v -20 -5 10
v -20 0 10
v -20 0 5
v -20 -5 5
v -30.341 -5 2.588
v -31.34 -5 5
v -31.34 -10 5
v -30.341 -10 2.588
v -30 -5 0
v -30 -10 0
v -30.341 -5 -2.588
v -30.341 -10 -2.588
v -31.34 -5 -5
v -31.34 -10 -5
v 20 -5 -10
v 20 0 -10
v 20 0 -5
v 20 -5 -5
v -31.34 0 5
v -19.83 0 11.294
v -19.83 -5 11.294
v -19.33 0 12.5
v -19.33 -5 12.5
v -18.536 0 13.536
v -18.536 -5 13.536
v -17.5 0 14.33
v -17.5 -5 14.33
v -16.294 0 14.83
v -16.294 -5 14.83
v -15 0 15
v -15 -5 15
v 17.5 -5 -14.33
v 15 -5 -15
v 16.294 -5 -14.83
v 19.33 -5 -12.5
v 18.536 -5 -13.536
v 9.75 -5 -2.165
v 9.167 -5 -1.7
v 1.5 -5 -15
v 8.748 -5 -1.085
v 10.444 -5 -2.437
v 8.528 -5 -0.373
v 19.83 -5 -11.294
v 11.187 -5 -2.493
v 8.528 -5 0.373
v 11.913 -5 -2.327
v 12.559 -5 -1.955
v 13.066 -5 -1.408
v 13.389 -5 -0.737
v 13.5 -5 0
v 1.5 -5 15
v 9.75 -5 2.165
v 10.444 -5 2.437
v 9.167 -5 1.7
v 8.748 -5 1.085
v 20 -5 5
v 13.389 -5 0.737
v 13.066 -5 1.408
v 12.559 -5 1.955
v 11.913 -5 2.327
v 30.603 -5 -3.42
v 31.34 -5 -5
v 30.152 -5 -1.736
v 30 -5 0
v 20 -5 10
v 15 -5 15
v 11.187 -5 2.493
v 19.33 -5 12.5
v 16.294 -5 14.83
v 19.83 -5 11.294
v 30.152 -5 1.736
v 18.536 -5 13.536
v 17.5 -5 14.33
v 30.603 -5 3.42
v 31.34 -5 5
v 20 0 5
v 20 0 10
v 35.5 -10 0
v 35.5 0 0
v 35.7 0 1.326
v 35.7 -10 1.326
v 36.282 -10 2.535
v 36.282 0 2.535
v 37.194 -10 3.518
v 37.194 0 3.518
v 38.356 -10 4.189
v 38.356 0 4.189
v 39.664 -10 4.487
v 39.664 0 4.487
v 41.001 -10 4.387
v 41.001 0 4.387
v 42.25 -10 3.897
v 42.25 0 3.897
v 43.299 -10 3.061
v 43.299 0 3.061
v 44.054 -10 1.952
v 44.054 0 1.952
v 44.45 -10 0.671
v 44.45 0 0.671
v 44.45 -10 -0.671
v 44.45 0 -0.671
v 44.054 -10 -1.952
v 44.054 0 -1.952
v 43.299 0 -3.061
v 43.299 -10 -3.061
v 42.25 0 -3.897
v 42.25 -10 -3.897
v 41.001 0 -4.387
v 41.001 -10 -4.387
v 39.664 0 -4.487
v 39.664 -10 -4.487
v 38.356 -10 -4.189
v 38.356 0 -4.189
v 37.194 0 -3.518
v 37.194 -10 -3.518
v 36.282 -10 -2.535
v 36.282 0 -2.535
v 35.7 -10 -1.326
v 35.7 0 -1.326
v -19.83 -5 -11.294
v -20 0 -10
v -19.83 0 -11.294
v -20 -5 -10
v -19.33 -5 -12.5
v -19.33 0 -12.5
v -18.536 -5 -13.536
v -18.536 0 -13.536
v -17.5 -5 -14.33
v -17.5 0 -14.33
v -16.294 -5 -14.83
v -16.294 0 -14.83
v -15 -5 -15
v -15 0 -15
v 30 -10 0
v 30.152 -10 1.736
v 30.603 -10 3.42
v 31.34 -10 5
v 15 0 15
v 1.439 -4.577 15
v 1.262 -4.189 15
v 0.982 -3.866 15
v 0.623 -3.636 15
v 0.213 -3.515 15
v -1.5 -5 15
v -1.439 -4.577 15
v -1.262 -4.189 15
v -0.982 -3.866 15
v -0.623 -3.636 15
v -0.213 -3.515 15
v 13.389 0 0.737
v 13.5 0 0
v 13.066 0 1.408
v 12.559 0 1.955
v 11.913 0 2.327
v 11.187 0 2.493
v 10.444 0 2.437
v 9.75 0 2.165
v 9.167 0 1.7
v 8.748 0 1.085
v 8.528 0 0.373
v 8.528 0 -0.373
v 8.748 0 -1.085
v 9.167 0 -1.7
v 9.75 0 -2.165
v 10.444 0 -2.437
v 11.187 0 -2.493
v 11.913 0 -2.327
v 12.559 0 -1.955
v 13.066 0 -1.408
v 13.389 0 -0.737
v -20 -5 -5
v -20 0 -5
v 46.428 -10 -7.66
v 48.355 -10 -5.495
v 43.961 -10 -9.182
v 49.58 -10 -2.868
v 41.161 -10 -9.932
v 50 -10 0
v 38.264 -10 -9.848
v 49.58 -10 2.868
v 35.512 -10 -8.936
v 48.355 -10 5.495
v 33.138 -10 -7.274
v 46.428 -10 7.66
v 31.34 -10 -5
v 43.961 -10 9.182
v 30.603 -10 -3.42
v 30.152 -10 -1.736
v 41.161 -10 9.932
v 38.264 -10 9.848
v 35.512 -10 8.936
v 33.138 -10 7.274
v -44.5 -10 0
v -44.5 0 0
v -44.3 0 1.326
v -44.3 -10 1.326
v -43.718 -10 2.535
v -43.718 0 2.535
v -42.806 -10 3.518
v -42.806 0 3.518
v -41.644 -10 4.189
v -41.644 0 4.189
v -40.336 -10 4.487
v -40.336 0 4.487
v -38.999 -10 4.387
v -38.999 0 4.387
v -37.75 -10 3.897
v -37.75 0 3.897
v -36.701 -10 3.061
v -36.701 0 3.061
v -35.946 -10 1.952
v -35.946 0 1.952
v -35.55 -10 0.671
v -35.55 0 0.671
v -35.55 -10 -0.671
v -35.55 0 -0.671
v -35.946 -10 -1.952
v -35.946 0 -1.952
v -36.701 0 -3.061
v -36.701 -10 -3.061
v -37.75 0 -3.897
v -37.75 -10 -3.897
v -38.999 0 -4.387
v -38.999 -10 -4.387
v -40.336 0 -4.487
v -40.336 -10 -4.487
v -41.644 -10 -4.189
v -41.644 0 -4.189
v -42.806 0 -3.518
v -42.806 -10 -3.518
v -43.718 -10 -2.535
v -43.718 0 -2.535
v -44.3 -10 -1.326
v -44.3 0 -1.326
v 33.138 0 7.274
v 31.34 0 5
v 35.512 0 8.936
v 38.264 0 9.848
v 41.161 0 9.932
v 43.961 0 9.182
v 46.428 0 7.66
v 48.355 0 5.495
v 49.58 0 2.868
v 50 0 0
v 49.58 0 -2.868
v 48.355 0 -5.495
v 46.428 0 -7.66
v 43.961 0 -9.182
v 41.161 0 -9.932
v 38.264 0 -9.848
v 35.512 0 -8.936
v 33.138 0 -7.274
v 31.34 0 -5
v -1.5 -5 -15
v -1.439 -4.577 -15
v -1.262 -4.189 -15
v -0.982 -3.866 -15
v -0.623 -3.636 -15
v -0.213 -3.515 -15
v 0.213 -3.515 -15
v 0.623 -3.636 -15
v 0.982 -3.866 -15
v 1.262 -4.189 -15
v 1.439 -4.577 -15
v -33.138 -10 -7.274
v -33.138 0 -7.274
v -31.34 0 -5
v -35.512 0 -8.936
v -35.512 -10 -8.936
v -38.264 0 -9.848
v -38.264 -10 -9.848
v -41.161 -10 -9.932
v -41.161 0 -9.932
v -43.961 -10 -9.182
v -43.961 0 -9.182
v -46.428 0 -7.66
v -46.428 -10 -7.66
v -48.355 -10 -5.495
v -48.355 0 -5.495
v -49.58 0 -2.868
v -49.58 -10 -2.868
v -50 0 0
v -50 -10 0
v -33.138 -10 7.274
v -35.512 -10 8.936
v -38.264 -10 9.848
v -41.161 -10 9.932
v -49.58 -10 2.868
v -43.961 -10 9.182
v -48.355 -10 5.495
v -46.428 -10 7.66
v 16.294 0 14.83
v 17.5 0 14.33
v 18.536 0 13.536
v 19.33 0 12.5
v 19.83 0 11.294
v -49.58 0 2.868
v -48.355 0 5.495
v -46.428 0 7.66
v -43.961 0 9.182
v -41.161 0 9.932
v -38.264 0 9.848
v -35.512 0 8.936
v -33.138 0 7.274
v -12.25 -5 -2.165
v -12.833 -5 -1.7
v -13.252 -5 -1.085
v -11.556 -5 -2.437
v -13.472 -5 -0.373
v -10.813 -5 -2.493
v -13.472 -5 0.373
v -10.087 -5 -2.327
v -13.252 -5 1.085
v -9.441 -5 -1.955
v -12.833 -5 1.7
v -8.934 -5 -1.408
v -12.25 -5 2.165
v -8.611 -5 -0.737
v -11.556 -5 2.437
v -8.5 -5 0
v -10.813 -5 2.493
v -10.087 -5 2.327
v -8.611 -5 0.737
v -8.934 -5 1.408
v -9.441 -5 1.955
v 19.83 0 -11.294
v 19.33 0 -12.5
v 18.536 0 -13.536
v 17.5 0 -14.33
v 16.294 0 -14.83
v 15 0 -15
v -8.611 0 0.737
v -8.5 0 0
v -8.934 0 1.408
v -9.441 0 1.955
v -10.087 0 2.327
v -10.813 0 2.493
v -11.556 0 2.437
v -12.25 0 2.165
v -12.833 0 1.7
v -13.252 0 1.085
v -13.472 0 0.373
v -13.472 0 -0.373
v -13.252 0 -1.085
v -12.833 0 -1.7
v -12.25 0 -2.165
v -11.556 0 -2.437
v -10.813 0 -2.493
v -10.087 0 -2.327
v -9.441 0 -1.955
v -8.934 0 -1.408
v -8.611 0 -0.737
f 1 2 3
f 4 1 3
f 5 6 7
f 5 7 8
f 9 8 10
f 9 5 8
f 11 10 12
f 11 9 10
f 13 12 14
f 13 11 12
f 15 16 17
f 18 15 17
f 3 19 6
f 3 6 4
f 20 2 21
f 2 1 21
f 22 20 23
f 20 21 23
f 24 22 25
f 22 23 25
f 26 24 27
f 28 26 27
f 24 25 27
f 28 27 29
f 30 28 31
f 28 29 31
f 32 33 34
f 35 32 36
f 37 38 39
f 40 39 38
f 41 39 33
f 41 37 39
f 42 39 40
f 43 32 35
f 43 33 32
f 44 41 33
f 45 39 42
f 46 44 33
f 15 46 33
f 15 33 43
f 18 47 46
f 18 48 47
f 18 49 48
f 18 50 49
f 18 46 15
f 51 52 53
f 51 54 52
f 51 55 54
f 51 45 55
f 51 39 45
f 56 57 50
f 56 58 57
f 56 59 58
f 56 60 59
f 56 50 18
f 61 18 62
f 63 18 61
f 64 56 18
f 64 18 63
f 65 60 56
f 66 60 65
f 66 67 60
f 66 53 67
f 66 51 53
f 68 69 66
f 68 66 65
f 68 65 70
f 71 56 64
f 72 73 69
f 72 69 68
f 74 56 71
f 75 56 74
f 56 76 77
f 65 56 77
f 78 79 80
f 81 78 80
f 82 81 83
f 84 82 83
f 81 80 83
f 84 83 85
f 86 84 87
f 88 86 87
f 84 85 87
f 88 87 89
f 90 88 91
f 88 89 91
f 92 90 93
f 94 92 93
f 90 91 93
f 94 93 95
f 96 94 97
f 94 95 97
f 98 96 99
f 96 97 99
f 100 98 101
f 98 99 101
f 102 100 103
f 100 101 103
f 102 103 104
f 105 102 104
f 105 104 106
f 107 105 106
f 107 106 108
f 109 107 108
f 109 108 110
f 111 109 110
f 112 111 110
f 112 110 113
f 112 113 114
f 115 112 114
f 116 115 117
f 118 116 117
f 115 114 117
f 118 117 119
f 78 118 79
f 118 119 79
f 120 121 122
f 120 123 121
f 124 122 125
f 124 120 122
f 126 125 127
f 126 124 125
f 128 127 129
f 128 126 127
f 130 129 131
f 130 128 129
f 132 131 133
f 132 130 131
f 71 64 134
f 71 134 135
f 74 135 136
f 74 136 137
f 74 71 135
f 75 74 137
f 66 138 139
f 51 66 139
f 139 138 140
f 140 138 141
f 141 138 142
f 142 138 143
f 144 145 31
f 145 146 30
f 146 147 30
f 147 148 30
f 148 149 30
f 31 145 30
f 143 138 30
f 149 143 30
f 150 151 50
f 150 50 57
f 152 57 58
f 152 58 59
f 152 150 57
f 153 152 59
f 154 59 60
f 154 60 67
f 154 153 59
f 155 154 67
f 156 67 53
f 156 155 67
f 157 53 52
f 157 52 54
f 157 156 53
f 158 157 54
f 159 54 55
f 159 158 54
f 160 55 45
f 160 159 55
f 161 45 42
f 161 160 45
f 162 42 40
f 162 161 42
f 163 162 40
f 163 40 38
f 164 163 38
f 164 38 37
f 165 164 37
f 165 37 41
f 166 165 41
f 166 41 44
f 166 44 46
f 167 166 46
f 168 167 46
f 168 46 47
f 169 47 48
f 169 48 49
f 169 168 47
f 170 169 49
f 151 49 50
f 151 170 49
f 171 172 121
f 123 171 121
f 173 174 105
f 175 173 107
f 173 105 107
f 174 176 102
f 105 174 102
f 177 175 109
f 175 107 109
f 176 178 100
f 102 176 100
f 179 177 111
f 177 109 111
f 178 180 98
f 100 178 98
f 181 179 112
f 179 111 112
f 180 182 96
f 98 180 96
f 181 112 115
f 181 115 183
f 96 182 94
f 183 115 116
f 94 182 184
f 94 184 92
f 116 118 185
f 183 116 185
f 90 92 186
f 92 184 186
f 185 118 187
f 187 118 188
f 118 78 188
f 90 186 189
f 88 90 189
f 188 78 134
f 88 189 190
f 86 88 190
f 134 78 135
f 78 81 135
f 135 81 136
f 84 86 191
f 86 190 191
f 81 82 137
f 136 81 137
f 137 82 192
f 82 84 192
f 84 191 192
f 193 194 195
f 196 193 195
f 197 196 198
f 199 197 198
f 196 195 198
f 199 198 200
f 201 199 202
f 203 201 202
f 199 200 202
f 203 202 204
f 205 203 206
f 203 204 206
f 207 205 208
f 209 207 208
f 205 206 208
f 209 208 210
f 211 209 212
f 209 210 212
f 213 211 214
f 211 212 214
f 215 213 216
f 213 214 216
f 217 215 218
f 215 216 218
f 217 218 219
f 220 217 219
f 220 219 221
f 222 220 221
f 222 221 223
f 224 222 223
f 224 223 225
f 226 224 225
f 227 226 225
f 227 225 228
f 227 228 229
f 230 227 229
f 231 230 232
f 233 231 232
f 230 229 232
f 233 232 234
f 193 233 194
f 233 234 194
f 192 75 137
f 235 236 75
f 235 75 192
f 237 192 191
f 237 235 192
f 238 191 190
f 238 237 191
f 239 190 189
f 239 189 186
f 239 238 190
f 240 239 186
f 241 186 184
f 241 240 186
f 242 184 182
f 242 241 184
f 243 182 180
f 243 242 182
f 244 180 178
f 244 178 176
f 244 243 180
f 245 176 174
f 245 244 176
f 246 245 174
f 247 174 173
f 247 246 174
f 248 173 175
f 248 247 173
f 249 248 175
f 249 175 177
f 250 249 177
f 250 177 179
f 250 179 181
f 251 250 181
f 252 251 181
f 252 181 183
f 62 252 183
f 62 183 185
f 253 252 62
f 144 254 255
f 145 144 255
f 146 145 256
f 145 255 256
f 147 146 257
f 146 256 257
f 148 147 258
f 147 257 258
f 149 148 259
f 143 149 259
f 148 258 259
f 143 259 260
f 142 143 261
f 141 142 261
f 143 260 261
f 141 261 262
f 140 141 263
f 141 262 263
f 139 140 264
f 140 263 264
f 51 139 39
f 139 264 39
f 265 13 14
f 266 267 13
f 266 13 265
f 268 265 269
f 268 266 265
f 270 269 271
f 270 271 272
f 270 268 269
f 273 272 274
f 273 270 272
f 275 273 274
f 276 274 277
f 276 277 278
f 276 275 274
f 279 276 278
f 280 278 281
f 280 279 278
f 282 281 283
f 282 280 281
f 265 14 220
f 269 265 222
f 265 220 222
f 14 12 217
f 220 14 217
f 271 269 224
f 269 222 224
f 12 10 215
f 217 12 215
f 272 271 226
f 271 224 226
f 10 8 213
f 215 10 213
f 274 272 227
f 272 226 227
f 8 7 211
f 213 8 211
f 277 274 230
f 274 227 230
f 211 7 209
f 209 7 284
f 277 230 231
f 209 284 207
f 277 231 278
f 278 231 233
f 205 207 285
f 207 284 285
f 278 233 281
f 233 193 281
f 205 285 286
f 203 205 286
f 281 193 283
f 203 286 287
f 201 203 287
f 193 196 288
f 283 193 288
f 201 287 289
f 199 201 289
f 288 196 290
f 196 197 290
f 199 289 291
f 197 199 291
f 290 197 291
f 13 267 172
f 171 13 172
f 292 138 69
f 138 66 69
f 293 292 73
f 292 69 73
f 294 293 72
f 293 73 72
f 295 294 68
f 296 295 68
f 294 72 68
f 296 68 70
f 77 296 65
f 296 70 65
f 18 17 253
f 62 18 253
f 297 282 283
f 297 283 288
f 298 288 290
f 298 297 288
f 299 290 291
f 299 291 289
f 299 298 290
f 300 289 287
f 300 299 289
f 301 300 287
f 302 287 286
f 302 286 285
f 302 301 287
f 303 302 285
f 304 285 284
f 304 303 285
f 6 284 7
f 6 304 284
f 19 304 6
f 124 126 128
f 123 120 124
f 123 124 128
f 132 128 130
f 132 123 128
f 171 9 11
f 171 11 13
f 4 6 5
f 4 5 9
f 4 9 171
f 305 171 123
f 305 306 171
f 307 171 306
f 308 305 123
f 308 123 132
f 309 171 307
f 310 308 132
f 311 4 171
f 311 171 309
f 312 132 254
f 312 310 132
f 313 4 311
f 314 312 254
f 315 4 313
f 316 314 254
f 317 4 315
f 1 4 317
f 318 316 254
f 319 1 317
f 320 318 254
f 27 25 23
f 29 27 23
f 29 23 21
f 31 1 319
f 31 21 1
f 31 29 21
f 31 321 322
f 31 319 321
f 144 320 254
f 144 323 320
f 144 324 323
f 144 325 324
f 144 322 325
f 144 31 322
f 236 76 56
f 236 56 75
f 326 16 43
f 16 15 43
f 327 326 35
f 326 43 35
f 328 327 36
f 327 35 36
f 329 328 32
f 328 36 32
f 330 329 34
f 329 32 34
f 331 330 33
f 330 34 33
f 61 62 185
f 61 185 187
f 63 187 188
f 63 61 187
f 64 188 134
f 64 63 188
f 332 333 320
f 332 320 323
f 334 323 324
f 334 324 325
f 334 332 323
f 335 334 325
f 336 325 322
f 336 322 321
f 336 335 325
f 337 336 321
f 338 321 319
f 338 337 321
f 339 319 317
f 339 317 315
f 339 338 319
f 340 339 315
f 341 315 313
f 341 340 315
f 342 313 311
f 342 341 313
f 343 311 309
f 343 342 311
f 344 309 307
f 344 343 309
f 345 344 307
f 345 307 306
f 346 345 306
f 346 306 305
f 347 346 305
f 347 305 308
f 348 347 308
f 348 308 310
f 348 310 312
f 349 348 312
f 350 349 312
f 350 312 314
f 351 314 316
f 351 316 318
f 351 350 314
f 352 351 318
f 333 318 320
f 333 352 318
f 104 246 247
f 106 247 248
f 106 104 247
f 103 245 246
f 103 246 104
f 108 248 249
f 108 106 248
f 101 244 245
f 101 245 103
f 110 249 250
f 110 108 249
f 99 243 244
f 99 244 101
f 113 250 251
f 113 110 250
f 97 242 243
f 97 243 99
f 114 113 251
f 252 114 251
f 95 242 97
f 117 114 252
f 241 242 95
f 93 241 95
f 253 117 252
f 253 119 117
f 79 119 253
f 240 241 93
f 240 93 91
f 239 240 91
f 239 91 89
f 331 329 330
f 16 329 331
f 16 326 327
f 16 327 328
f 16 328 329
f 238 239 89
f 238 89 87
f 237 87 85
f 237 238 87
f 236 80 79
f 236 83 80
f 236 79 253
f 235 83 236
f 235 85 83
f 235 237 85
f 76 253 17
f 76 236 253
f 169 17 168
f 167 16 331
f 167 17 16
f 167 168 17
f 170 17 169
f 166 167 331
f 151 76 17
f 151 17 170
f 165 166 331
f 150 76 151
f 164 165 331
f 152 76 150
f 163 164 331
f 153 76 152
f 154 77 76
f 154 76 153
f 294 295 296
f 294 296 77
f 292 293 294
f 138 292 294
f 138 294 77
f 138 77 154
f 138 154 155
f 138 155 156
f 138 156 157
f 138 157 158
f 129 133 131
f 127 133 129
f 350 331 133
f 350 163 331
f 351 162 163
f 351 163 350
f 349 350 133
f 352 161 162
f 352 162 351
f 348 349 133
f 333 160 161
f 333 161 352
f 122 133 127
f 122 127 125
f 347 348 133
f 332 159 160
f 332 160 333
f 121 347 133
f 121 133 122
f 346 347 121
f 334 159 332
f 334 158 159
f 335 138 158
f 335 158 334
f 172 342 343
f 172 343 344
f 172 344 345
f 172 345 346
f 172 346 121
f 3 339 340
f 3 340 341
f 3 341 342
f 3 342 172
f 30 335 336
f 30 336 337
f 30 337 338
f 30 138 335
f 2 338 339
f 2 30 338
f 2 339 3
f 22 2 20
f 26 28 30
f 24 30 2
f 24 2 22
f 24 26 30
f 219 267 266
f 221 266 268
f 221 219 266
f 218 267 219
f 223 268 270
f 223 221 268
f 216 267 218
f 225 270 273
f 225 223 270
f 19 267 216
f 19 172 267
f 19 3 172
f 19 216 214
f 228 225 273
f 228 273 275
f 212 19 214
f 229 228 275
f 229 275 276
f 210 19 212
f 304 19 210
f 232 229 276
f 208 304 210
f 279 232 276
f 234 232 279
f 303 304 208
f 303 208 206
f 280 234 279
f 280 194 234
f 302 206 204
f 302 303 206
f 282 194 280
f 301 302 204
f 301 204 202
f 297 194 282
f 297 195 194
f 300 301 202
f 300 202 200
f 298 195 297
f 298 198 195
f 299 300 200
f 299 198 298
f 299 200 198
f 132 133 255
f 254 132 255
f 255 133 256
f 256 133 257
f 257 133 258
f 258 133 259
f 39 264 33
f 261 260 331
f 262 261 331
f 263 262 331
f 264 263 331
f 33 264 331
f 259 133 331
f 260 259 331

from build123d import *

# Parameters (mm, degrees)
F0_W     = 15
F0_H     = 10
F0_R     = 2.5
F1_DEPTH = 5
F3_DEPTH = 31
F4_R     = 4.5
F5_DEPTH = 10
F6_R     = 5


# Not quite as in the source:
# - a feature names something its author has since deleted; it is built from what else it names


with BuildPart() as f1:
    # F0 (on Front) → F1 (new body)
    with BuildSketch(Plane.XZ):
        with Locations((-27.5, 0)):
            Rectangle(F0_W, F0_H)
        Polygon((20, 15), (-20, 15), (-20, 5), (-20, -5), (-20, -15), (20, -15), (20, -5), (20, 5), align=None)
        with Locations((-11, 0)):
            Circle(F0_R, mode=Mode.SUBTRACT)
        with Locations((11, 0)):
            Circle(F0_R, mode=Mode.SUBTRACT)
        with Locations((27.5, 0)):
            Rectangle(F0_W, F0_H)
    extrude(amount=F1_DEPTH)

    # F2 (on face) → F3 (cut)
    with BuildSketch(Plane(origin=(0, 0, -15), x_dir=(1, 0, 0), z_dir=(0, 0, -1))):
        with BuildLine():
            ThreePointArc((-1.5, 5), (0, 3.5), (1.5, 5))
            Line((1.5, 5), (-1.5, 5))
        make_face()
    extrude(amount=-F3_DEPTH, mode=Mode.SUBTRACT)

    # F4 (on face) → F5 (join)
    with BuildSketch(Plane(origin=(0, 0, 0), x_dir=(-1, 0, 0), z_dir=(0, 1, 0))):
        with BuildLine():
            ThreePointArc((50, 0), (42.588190451, 9.6592582629), (31.3397459622, 5))
            Line((31.3397459622, 5), (35, 5))
            Line((35, 5), (35, -5))
            Line((35, -5), (31.3397459622, -5))
            ThreePointArc((31.3397459622, -5), (42.588190451, -9.6592582629), (50, 0))
        make_face()
        with Locations((40, 0)):
            Circle(F4_R, mode=Mode.SUBTRACT)
        with BuildLine():
            Line((-35, 5), (-31.3397459622, 5))
            ThreePointArc((-31.3397459622, 5), (-50, 0), (-31.3397459622, -5))
            Line((-31.3397459622, -5), (-35, -5))
            Line((-35, -5), (-35, 5))
        make_face()
        with Locations((-40, 0)):
            Circle(F4_R, mode=Mode.SUBTRACT)
        with BuildLine():
            ThreePointArc((-31.3397459622, -5), (-30.3407417371, -2.588190451), (-30, 0))
            ThreePointArc((-30, 0), (-30.3407417371, 2.588190451), (-31.3397459622, 5))
            Line((-31.3397459622, 5), (-35, 5))
            Line((-35, 5), (-35, -5))
            Line((-35, -5), (-31.3397459622, -5))
        make_face()
        with BuildLine():
            Line((35, 5), (31.3397459622, 5))
            ThreePointArc((31.3397459622, 5), (30, 0), (31.3397459622, -5))
            Line((31.3397459622, -5), (35, -5))
            Line((35, -5), (35, 5))
        make_face()
    extrude(amount=-F5_DEPTH)

    # F6
    f6_edges = [f1.edges().sort_by_distance(p)[0] for p in [
        (20, -2.5, -15),
        (20, -2.5, 15),
        (-20, -2.5, 15),
        (-20, -2.5, -15),
    ]]
    fillet(f6_edges, radius=F6_R)


solid = f1.part
